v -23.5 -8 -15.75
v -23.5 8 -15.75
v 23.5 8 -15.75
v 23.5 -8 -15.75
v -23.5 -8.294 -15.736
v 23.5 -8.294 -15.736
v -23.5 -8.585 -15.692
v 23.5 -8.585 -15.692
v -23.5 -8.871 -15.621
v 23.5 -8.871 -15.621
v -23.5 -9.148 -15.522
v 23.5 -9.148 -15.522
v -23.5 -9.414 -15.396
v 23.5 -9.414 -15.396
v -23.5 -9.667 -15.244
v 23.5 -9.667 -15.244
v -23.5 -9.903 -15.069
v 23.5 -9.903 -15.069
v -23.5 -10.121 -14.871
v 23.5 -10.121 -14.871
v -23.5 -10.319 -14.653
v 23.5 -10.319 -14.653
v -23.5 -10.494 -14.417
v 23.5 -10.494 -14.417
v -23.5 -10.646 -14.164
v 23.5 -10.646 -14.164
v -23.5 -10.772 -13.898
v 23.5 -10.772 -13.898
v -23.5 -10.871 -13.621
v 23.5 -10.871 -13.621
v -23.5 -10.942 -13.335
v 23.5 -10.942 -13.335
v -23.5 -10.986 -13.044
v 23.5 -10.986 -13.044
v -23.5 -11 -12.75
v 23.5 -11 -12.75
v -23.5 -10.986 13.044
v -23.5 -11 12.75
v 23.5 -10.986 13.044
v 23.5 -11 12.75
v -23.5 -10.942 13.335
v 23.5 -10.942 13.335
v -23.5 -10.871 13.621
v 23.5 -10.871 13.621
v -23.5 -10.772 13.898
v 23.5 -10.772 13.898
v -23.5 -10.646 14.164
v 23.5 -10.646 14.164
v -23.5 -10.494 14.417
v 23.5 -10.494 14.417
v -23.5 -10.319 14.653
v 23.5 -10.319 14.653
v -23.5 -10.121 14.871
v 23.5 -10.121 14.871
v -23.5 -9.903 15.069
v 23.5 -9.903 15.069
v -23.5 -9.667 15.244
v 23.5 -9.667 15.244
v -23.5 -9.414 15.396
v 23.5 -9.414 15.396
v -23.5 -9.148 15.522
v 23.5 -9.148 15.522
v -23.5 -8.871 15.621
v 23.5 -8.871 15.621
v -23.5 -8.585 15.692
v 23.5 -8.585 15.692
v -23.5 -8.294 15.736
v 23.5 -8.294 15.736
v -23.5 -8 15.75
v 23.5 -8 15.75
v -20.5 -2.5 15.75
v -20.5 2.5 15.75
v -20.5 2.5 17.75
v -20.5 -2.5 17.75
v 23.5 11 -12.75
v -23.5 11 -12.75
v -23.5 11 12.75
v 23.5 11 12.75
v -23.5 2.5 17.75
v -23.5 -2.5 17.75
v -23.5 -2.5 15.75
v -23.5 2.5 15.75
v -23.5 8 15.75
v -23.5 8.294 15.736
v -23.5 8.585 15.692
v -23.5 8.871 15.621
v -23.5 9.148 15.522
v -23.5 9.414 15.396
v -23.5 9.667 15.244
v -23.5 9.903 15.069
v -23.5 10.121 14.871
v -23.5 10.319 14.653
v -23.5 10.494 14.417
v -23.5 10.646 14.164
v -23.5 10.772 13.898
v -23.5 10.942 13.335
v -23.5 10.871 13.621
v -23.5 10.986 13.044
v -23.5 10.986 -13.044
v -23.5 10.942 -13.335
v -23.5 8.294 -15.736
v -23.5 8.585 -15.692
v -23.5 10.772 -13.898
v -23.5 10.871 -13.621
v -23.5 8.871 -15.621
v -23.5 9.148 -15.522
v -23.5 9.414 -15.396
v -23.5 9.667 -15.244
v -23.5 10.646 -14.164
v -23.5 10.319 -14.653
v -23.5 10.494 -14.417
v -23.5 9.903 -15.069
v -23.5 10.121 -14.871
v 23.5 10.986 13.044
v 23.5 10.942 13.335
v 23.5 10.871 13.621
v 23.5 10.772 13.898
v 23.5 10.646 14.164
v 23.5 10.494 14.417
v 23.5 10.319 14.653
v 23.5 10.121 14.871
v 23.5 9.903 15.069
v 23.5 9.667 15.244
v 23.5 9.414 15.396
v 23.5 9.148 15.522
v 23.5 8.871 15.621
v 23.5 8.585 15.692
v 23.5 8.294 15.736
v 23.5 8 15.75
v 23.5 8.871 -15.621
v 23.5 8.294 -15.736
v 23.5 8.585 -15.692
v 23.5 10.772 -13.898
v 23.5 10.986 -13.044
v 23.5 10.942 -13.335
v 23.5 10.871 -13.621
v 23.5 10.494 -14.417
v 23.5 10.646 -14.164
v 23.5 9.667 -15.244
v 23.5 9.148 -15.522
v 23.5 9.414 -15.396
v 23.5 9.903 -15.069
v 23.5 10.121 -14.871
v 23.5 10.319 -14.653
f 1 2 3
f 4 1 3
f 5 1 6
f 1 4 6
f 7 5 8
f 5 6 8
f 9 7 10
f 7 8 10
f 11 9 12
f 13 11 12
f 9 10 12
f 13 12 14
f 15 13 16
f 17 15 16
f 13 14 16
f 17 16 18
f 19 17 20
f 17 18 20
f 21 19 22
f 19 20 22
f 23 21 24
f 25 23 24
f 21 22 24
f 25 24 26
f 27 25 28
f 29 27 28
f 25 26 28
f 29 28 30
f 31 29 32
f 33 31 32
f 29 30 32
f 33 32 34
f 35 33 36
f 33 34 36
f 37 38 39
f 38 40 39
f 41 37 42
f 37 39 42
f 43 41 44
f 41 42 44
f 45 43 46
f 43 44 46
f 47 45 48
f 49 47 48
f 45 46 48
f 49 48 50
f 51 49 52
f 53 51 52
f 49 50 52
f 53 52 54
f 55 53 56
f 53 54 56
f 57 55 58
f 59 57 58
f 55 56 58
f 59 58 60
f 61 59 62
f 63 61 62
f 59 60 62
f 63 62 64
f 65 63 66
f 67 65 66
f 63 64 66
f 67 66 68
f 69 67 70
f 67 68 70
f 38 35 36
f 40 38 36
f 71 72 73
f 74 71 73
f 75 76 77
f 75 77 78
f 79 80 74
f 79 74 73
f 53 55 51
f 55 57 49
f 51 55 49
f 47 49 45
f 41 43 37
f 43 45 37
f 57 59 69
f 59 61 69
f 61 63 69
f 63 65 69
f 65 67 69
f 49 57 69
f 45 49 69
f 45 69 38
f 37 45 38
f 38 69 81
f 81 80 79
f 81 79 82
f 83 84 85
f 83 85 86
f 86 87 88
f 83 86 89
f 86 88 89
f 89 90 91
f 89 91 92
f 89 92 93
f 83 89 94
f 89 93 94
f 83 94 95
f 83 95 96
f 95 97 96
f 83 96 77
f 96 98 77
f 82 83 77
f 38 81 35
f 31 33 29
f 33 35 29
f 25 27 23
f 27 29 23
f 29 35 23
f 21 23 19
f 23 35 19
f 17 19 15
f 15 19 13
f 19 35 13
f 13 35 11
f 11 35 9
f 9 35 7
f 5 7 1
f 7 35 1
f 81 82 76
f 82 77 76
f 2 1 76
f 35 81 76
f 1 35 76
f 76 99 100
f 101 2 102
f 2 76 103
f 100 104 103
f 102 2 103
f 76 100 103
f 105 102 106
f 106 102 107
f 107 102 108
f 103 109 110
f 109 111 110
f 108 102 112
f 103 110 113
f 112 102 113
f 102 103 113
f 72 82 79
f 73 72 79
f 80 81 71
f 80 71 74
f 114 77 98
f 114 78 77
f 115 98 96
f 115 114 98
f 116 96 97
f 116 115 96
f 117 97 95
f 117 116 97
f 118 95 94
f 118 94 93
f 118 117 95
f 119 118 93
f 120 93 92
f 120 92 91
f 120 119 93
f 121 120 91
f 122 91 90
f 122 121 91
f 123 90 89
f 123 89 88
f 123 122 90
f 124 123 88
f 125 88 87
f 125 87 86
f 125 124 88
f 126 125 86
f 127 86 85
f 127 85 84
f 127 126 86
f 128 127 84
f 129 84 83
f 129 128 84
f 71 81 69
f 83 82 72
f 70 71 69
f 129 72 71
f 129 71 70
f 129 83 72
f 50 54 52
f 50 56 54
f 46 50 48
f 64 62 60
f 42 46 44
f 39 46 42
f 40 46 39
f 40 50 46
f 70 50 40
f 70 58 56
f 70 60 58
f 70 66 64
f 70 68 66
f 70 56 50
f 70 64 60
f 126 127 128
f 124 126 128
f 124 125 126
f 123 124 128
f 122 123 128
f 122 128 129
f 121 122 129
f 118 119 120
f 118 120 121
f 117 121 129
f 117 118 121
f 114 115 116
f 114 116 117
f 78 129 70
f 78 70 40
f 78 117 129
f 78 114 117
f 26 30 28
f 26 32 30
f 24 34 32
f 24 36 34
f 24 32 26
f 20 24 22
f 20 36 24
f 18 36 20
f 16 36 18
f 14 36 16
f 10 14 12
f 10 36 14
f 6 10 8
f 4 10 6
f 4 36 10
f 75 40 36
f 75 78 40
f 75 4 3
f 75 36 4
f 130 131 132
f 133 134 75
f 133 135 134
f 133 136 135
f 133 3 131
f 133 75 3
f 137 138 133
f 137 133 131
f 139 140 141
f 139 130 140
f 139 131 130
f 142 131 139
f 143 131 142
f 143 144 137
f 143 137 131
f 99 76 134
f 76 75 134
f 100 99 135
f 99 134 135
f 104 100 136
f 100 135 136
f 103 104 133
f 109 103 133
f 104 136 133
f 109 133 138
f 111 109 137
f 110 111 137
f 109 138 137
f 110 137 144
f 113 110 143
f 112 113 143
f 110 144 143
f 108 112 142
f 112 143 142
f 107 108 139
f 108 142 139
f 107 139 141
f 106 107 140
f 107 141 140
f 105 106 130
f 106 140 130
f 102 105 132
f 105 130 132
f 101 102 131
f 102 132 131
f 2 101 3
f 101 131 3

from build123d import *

# Parameters (mm, degrees)
SKETCH_1_W      = 47
SKETCH_1_H      = 31.5
EXTRUDE_1_DEPTH = 11
FILLET_1_R      = 3
SKETCH_2_W      = 10
SKETCH_2_H      = 5
EXTRUDE_2_DEPTH = 3


with BuildPart() as part:
    # ｽｹｯﾁ1 → ﾎﾞｽ - 押し出し1 (new, symmetric)
    with BuildSketch(Plane(origin=(0, 0, 0), x_dir=(1, 0, 0), z_dir=(0, 1, 0))):
        Rectangle(SKETCH_1_W, SKETCH_1_H)
    extrude(amount=EXTRUDE_1_DEPTH, both=True)

    # ﾌｨﾚｯﾄ1
    fillet_1_edges = [part.edges().sort_by_distance(p)[0] for p in [
        (0, 11, 15.75),
        (0, -11, 15.75),
        (0, -11, -15.75),
        (0, 11, -15.75),
    ]]
    fillet(fillet_1_edges, radius=FILLET_1_R)

    # ｽｹｯﾁ2 → ﾎﾞｽ - 押し出し2 (add)
    with BuildSketch(Plane.ZY.offset(23.5)):
        with Locations((12.75, 0)):
            Rectangle(SKETCH_2_W, SKETCH_2_H)
    extrude(amount=-EXTRUDE_2_DEPTH)


solid = part.part
